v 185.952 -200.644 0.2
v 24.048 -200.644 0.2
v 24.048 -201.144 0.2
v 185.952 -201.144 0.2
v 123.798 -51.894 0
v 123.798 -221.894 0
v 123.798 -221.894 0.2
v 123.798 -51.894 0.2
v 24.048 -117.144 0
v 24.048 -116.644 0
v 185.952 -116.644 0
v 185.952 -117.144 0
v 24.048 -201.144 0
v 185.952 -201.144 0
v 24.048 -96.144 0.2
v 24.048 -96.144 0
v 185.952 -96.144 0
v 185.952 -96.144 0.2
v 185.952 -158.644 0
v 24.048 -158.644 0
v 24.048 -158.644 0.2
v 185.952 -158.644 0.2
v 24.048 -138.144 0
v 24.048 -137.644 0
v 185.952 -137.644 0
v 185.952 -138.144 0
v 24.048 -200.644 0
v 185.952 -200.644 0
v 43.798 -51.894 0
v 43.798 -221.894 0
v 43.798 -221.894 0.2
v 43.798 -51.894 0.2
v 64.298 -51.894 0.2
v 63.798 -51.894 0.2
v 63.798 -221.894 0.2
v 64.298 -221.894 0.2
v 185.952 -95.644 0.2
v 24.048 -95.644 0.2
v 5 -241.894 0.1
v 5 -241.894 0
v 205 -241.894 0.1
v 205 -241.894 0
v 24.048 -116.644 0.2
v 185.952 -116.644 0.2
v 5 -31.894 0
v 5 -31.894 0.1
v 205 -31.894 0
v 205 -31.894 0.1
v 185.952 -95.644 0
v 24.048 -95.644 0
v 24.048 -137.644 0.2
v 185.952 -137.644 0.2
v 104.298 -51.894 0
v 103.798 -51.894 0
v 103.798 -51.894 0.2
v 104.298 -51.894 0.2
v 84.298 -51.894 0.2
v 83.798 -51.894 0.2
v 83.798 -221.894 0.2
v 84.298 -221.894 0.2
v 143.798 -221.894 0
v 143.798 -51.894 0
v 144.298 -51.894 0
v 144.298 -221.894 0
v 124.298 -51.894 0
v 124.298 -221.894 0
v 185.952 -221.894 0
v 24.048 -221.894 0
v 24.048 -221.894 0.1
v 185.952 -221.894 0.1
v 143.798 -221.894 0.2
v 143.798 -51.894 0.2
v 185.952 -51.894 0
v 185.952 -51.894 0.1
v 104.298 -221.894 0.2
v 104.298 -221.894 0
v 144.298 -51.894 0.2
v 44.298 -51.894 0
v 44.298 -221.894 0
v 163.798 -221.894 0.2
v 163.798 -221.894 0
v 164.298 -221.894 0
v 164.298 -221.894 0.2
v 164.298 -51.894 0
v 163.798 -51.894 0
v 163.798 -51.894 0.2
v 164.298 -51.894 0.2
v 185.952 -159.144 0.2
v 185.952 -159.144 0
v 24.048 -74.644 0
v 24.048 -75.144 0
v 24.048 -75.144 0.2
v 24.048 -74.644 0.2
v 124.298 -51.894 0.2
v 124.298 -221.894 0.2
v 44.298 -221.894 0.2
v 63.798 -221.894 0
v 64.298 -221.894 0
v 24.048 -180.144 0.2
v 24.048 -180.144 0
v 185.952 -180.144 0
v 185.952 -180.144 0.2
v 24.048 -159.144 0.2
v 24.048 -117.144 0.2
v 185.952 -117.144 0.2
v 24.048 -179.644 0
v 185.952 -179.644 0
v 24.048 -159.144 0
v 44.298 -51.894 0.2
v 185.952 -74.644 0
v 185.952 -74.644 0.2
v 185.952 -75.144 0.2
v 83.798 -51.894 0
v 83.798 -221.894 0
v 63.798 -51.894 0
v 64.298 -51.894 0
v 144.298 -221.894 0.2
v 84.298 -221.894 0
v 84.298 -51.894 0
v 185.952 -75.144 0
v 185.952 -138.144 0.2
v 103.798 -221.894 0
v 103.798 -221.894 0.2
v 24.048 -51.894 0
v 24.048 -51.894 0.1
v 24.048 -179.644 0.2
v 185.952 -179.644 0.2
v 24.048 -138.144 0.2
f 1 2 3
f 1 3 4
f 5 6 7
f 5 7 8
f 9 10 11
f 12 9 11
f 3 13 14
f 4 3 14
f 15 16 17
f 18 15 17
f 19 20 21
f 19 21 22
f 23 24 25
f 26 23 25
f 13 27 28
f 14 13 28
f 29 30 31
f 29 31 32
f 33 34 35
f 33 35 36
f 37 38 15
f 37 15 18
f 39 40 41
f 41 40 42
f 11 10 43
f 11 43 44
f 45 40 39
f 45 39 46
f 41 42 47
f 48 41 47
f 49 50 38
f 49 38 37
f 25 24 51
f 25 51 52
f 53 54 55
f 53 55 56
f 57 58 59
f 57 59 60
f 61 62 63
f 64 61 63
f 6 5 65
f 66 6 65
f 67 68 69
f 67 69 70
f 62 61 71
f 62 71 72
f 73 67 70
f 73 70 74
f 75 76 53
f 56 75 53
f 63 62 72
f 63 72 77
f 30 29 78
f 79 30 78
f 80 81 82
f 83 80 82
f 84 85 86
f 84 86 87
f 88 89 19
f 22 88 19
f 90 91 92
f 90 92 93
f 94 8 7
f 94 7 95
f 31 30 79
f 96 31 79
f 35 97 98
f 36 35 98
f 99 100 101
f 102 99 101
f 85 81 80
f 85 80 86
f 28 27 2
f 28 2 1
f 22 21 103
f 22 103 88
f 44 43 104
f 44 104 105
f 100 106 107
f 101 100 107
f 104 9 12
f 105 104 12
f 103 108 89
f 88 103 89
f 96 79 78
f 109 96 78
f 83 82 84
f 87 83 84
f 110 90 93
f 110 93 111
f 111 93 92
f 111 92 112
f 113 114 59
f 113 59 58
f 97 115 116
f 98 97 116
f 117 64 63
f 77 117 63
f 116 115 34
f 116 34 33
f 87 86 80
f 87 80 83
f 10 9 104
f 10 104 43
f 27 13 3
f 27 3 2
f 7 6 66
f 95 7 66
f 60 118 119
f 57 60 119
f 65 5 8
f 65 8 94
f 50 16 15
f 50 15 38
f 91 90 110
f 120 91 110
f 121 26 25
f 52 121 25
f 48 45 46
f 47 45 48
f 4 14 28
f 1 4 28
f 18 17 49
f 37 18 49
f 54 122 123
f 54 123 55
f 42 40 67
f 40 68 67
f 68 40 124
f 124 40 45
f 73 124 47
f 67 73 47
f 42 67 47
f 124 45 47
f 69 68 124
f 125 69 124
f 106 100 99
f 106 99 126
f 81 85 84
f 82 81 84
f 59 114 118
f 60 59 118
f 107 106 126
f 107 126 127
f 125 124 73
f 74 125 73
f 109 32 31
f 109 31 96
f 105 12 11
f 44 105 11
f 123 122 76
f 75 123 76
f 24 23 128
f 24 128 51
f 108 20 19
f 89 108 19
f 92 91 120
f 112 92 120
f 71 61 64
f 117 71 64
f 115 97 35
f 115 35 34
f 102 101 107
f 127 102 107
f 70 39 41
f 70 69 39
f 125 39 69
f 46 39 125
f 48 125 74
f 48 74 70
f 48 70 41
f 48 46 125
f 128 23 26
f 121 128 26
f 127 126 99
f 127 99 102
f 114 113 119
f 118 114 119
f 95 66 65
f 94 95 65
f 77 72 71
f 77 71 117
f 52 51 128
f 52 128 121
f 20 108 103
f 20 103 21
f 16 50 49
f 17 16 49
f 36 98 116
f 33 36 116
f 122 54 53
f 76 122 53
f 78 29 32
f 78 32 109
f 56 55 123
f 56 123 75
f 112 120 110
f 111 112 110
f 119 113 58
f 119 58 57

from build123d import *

# Parameters (mm, degrees)
SKETCH_2_W           = 200
SKETCH_2_H           = 210
SKETCH_2_W_2         = 161.904761904
SKETCH_2_H_2         = 170
EXTRUDE_1_DEPTH      = 0.1
SKETCH_3_W           = 0.5
SKETCH_3_H           = 170
EXTRUDE_1_2_DEPTH    = 0.2
EXTRUDE_1_2_2_DEPTH  = 0.2
EXTRUDE_1_2_3_DEPTH  = 0.2
EXTRUDE_1_2_4_DEPTH  = 0.2
EXTRUDE_1_2_5_DEPTH  = 0.2
EXTRUDE_1_2_6_DEPTH  = 0.2
EXTRUDE_1_2_7_DEPTH  = 0.2
SKETCH_3_W_2         = 161.904761904
SKETCH_3_H_2         = 0.5
EXTRUDE_1_2_8_DEPTH  = 0.2
EXTRUDE_1_2_9_DEPTH  = 0.2
EXTRUDE_1_2_10_DEPTH = 0.2
EXTRUDE_1_2_11_DEPTH = 0.2
EXTRUDE_1_2_12_DEPTH = 0.2
EXTRUDE_1_2_13_DEPTH = 0.2
EXTRUDE_1_2_14_DEPTH = 0.2


with BuildPart() as part:
    # 草图2 → Extrude 1 (new body)
    with BuildSketch(Plane.XY):
        with Locations((105, -136.893726012)):
            Rectangle(SKETCH_2_W, SKETCH_2_H)
        with Locations((105, -136.893726012)):
            Rectangle(SKETCH_2_W_2, SKETCH_2_H_2, mode=Mode.SUBTRACT)
    extrude(amount=EXTRUDE_1_DEPTH)


with BuildPart() as body_2:
    # 草图3 → Extrude 1 2 (new body)
    with BuildSketch(Plane.XY):
        with Locations((44.047619048, -136.893726012)):
            Rectangle(SKETCH_3_W, SKETCH_3_H)
    extrude(amount=EXTRUDE_1_2_DEPTH)


with BuildPart() as body_3:
    # 草图3 → Extrude 1 2 2 (new body)
    with BuildSketch(Plane.XY):
        with Locations((64.047619048, -136.893726012)):
            Rectangle(SKETCH_3_W, SKETCH_3_H)
    extrude(amount=EXTRUDE_1_2_2_DEPTH)


with BuildPart() as body_4:
    # 草图3 → Extrude 1 2 3 (new body)
    with BuildSketch(Plane.XY):
        with Locations((84.047619048, -136.893726012)):
            Rectangle(SKETCH_3_W, SKETCH_3_H)
    extrude(amount=EXTRUDE_1_2_3_DEPTH)


with BuildPart() as body_5:
    # 草图3 → Extrude 1 2 4 (new body)
    with BuildSketch(Plane.XY):
        with Locations((104.047619048, -136.893726012)):
            Rectangle(SKETCH_3_W, SKETCH_3_H)
    extrude(amount=EXTRUDE_1_2_4_DEPTH)


with BuildPart() as body_6:
    # 草图3 → Extrude 1 2 5 (new body)
    with BuildSketch(Plane.XY):
        with Locations((124.047619048, -136.893726012)):
            Rectangle(SKETCH_3_W, SKETCH_3_H)
    extrude(amount=EXTRUDE_1_2_5_DEPTH)


with BuildPart() as body_7:
    # 草图3 → Extrude 1 2 6 (new body)
    with BuildSketch(Plane.XY):
        with Locations((144.047619048, -136.893726012)):
            Rectangle(SKETCH_3_W, SKETCH_3_H)
    extrude(amount=EXTRUDE_1_2_6_DEPTH)


with BuildPart() as body_8:
    # 草图3 → Extrude 1 2 7 (new body)
    with BuildSketch(Plane.XY):
        with Locations((164.047619048, -136.893726012)):
            Rectangle(SKETCH_3_W, SKETCH_3_H)
    extrude(amount=EXTRUDE_1_2_7_DEPTH)


with BuildPart() as body_9:
    # 草图3 → Extrude 1 2 8 (new body)
    with BuildSketch(Plane.XY):
        with Locations((105, -200.893726012)):
            Rectangle(SKETCH_3_W_2, SKETCH_3_H_2)
    extrude(amount=EXTRUDE_1_2_8_DEPTH)


with BuildPart() as body_10:
    # 草图3 → Extrude 1 2 9 (new body)
    with BuildSketch(Plane.XY):
        with Locations((105, -179.893726012)):
            Rectangle(SKETCH_3_W_2, SKETCH_3_H_2)
    extrude(amount=EXTRUDE_1_2_9_DEPTH)


with BuildPart() as body_11:
    # 草图3 → Extrude 1 2 10 (new body)
    with BuildSketch(Plane.XY):
        with Locations((105, -158.893726012)):
            Rectangle(SKETCH_3_W_2, SKETCH_3_H_2)
    extrude(amount=EXTRUDE_1_2_10_DEPTH)


with BuildPart() as body_12:
    # 草图3 → Extrude 1 2 11 (new body)
    with BuildSketch(Plane.XY):
        with Locations((105, -137.893726012)):
            Rectangle(SKETCH_3_W_2, SKETCH_3_H_2)
    extrude(amount=EXTRUDE_1_2_11_DEPTH)


with BuildPart() as body_13:
    # 草图3 → Extrude 1 2 12 (new body)
    with BuildSketch(Plane.XY):
        with Locations((105, -116.893726012)):
            Rectangle(SKETCH_3_W_2, SKETCH_3_H_2)
    extrude(amount=EXTRUDE_1_2_12_DEPTH)


with BuildPart() as body_14:
    # 草图3 → Extrude 1 2 13 (new body)
    with BuildSketch(Plane.XY):
        with Locations((105, -95.893726012)):
            Rectangle(SKETCH_3_W_2, SKETCH_3_H_2)
    extrude(amount=EXTRUDE_1_2_13_DEPTH)


with BuildPart() as body_15:
    # 草图3 → Extrude 1 2 14 (new body)
    with BuildSketch(Plane.XY):
        with Locations((105, -74.893726012)):
            Rectangle(SKETCH_3_W_2, SKETCH_3_H_2)
    extrude(amount=EXTRUDE_1_2_14_DEPTH)


solid = Compound([part.part, body_2.part, body_3.part, body_4.part, body_5.part, body_6.part, body_7.part, body_8.part, body_9.part, body_10.part, body_11.part, body_12.part, body_13.part, body_14.part, body_15.part])
